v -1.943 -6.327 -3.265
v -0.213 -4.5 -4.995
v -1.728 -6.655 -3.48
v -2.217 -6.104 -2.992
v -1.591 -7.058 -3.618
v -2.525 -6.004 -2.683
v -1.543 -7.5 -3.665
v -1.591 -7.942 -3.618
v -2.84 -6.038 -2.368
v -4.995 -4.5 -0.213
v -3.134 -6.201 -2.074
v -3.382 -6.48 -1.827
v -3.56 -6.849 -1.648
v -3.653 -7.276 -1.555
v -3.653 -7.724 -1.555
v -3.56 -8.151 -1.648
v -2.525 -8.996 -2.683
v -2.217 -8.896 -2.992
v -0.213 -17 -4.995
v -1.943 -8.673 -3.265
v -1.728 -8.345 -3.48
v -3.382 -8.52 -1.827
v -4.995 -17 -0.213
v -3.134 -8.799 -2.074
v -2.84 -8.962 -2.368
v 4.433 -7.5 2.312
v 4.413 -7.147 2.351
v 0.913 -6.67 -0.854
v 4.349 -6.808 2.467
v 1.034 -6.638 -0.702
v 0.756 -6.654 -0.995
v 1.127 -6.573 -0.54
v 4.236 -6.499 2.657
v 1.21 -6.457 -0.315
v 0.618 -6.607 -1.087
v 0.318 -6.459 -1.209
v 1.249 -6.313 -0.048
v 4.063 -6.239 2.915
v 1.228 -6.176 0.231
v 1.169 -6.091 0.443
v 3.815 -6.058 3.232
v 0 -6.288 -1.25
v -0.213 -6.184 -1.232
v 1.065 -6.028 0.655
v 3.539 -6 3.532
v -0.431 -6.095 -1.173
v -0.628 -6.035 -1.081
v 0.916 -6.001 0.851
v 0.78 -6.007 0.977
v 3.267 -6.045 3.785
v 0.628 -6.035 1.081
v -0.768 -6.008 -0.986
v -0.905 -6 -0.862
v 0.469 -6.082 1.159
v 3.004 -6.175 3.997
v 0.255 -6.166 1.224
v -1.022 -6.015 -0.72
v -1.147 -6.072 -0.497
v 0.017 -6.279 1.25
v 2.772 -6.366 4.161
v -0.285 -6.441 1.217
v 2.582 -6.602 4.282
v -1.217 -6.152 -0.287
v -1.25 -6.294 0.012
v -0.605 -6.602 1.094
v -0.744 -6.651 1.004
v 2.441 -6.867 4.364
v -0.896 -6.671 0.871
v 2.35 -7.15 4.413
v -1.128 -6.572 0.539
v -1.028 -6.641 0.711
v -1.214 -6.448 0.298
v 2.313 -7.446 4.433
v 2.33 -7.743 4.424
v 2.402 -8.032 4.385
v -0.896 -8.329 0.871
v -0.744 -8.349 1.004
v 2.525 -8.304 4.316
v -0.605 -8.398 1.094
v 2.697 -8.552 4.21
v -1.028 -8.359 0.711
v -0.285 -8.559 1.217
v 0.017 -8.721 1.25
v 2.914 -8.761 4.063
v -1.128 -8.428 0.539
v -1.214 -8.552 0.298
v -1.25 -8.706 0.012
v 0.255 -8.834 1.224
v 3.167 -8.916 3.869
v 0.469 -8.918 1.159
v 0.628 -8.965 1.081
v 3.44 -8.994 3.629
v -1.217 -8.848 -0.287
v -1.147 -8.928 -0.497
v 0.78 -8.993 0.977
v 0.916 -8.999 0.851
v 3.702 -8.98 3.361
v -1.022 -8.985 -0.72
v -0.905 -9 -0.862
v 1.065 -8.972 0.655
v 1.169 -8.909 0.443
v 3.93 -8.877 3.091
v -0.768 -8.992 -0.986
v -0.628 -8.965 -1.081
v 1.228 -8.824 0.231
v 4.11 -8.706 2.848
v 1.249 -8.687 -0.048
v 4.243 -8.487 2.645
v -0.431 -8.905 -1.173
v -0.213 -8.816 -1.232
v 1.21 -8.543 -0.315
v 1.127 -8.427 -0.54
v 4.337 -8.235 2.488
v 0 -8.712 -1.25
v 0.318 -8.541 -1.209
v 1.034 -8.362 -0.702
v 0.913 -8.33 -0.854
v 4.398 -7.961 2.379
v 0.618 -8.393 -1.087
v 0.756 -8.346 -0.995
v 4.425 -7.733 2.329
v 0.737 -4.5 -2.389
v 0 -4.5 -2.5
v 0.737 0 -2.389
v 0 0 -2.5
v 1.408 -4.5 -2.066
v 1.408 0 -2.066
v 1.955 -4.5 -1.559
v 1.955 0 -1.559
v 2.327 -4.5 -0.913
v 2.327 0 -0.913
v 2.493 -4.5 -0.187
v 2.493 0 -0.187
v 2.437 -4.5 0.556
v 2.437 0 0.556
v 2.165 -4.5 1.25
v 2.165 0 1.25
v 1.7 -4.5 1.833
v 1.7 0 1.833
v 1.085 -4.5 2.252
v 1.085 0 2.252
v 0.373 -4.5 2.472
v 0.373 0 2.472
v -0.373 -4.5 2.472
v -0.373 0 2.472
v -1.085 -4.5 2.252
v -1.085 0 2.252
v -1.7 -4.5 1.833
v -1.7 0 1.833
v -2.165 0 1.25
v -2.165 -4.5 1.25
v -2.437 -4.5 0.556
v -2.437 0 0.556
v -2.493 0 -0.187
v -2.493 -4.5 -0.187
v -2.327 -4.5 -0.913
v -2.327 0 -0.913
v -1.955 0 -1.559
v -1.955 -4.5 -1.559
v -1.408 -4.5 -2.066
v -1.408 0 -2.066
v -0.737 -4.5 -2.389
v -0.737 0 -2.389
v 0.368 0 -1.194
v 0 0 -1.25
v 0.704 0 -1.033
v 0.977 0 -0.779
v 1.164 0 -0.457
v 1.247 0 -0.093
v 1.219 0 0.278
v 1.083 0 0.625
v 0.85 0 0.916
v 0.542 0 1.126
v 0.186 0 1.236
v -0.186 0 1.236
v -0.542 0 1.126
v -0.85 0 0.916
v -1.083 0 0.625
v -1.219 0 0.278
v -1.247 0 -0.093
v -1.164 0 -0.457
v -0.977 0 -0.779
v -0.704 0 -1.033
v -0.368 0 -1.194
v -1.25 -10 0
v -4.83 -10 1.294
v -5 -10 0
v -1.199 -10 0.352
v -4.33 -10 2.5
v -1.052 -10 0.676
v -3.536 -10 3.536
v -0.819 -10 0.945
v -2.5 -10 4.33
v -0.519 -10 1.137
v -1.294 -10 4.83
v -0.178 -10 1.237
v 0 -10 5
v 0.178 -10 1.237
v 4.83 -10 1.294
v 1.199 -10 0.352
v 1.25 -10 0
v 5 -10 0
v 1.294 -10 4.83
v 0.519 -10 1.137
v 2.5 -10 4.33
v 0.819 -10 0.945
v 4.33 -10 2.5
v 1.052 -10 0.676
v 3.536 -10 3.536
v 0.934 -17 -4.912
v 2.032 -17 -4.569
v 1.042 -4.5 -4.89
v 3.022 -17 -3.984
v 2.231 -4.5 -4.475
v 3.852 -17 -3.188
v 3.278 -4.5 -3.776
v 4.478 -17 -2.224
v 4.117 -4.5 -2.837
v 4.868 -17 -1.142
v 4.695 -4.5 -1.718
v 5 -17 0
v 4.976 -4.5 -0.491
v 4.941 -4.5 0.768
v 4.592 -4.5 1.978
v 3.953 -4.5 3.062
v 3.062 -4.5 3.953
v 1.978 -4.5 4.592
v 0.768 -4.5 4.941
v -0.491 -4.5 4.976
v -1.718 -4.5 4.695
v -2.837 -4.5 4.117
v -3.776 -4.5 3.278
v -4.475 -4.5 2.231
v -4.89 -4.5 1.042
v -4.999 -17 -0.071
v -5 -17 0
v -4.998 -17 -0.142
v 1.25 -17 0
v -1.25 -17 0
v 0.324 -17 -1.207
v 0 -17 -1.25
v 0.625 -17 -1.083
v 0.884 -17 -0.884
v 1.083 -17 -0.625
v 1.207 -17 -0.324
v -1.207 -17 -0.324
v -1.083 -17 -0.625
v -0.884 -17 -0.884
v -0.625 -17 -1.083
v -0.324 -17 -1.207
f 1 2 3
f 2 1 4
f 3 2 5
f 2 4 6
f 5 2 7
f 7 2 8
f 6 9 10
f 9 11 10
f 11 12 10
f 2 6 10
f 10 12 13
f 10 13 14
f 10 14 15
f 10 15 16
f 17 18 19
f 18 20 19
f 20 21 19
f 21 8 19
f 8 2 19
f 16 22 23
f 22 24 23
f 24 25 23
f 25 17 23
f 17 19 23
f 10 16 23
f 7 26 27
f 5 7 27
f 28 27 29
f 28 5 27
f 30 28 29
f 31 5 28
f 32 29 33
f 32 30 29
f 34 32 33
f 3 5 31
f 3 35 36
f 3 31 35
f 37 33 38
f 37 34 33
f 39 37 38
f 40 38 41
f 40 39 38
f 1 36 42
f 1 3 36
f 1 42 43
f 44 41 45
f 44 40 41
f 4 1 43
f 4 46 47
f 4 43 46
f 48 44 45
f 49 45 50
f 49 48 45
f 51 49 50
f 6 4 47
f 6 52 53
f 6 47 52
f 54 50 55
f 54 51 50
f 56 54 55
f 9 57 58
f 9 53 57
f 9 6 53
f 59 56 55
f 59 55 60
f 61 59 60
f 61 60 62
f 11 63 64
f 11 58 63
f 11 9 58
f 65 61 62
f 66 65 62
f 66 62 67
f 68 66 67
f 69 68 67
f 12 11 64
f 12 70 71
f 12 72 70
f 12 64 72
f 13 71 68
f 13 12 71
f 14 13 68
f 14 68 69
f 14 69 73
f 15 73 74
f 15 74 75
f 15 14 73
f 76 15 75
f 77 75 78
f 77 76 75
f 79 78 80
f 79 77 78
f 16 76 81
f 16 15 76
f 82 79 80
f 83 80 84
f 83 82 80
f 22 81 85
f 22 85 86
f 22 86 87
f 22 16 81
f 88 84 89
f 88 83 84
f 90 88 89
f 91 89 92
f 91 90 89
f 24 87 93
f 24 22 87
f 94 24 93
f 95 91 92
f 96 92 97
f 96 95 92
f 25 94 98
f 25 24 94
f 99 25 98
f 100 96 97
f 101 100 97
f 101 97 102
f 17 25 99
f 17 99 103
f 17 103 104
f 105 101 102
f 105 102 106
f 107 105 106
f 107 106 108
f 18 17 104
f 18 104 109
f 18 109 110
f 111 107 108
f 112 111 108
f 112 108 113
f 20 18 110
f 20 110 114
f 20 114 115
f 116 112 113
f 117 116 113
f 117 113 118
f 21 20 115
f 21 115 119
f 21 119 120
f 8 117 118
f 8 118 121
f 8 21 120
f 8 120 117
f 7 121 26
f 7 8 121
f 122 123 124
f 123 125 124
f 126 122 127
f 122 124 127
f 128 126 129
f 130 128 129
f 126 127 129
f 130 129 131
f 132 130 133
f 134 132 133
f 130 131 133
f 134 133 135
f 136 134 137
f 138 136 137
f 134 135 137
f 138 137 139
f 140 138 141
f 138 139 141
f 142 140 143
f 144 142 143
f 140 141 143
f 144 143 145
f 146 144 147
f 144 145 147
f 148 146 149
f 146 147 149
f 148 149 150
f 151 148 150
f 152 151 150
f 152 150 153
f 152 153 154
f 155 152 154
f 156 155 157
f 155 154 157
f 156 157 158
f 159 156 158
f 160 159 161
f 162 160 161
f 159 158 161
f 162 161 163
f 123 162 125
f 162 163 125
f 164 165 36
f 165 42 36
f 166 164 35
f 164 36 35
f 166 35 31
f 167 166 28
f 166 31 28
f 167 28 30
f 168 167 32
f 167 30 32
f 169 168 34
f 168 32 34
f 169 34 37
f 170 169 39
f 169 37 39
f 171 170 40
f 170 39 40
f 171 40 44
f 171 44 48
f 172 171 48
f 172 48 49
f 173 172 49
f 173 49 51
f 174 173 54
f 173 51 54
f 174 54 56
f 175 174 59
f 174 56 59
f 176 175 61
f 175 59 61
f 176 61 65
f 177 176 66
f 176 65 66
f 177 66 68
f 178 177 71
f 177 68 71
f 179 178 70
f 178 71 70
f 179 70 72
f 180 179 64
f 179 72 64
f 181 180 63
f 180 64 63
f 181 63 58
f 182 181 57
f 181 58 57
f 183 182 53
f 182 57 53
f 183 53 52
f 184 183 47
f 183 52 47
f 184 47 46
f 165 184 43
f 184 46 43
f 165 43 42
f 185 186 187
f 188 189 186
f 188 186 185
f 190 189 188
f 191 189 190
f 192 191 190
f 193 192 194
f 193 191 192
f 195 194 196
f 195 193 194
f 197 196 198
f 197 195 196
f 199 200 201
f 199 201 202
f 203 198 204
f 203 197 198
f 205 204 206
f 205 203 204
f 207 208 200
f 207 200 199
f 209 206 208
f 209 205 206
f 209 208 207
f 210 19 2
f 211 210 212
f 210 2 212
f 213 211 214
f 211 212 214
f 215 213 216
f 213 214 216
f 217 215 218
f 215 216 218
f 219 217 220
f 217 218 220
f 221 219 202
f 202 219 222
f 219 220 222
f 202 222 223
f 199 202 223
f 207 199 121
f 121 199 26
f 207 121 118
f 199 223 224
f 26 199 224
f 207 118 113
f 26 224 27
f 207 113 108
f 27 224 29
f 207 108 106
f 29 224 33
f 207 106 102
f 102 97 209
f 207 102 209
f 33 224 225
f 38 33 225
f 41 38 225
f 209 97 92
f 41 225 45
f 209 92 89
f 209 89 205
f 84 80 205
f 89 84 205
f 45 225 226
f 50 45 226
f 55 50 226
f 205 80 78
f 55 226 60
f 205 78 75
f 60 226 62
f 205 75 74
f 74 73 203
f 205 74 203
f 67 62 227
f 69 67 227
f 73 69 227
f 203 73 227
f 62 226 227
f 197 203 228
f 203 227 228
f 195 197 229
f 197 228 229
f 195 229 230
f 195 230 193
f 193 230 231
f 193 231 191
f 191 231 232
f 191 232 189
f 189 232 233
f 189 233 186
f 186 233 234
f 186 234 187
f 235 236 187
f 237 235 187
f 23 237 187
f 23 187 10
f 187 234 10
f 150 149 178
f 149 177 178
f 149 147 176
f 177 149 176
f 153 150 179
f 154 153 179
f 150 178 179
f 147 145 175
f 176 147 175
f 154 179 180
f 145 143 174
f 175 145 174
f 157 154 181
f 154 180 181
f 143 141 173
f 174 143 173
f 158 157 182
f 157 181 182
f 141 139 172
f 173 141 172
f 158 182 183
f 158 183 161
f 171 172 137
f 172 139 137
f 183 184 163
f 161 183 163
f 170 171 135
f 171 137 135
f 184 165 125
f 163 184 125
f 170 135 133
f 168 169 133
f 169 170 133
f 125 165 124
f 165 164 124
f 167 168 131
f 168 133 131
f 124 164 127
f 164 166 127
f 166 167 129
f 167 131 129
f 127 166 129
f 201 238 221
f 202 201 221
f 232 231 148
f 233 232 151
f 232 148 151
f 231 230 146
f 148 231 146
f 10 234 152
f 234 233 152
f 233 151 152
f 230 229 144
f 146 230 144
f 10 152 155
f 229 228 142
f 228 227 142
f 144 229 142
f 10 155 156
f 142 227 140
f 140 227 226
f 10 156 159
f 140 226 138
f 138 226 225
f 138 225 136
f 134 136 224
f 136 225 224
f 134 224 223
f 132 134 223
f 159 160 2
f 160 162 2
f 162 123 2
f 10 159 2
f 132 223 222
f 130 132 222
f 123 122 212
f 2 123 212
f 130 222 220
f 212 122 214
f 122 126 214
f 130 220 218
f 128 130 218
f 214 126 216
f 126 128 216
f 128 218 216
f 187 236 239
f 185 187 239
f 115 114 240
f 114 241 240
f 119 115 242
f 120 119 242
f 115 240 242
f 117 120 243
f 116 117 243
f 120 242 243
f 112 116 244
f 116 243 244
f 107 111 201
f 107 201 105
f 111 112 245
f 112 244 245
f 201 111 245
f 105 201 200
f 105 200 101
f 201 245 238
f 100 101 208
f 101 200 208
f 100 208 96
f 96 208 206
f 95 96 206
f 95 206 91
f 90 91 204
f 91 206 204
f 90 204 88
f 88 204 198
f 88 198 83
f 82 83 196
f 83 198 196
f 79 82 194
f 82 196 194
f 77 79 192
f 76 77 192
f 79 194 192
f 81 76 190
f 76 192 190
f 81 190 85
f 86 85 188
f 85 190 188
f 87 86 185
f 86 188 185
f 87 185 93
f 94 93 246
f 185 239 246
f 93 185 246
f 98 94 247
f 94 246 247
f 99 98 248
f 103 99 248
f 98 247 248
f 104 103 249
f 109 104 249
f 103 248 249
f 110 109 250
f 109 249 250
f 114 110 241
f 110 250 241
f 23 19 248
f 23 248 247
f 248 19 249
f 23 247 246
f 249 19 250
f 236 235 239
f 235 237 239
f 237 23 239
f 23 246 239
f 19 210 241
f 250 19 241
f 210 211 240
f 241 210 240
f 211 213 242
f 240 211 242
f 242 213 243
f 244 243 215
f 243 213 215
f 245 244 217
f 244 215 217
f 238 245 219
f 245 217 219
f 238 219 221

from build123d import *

# Parameters (mm, degrees)
CUT_EXTRUDE_1_DEPTH             = 7
CUT_EXTRUDE_2_DEPTH             = 18
SKETCH_5_R                      = 1.5
CUT_EXTRUDE_3_DEPTH             = 4.388378183
CUT_EXTRUDE_3_DIRECTION_2_REACH = 12.754


with BuildPart() as part:
    # Эскиз1 → Повернуть1 (revolve)
    with BuildSketch(Plane(origin=(0, 0, 0), x_dir=(0, 0, -1), z_dir=(1, 0, 0))):
        Polygon((2.5, -4.5), (2.5, 0), (1.25, 0), (1.25, -17), (5, -17), (5, -4.5), align=None)
    revolve(axis=Axis((0, 0, 0), (0, -1, 0)))

    # Эскиз2 → Вырез-Вытянуть1 (cut)
    with BuildSketch(Plane.XZ.offset(17)):
        Polygon((-37.360679775, 0), (-5, 0), (5, 0), (37.360679775, 0), (37.360679775, 64.72135955), (-37.360679775, 64.72135955), align=None)
    extrude(amount=-CUT_EXTRUDE_1_DEPTH, mode=Mode.SUBTRACT)

    # Эскиз3 → Вырез-Вытянуть2 (cut, through all)
    with BuildSketch(Plane.XZ.offset(17)):
        with BuildLine():
            Line((-0.212632943, -4.995476677), (-4.995476677, -0.212632943))
            ThreePointArc((-4.995476677, -0.212632943), (-3.535533906, -3.535533906), (-0.212632943, -4.995476677))
        make_face()
    extrude(amount=-CUT_EXTRUDE_2_DEPTH, mode=Mode.SUBTRACT)

    # Эскиз5 → Вырез-Вытянуть3 (cut)
    with BuildSketch(Plane(origin=(-7.70810962, 0, 2.5), x_dir=(0.707106781, 0, -0.707106781), z_dir=(0.707106781, 0, 0.707106781))):
        with Locations((7.218223535, -7.5)):
            Circle(SKETCH_5_R)
    extrude(amount=-CUT_EXTRUDE_3_DEPTH, mode=Mode.SUBTRACT)

    # Эскиз5 → Вырез-Вытянуть3 direction 2 (cut, up to next)
    with BuildSketch(Plane(origin=(-7.70810962, 0, 2.5), x_dir=(0.707106781, 0, -0.707106781), z_dir=(0.707106781, 0, 0.707106781)), mode=Mode.PRIVATE) as cut_extrude_3_direction_2_sk1:
        with Locations((7.218223535, -7.5)):
            Circle(SKETCH_5_R)
    cut_extrude_3_direction_2_tool1 = extrude(cut_extrude_3_direction_2_sk1.sketch, amount=CUT_EXTRUDE_3_DIRECTION_2_REACH, mode=Mode.PRIVATE) & part.part
    add(cut_extrude_3_direction_2_tool1.solids().sort_by_distance((-2.604055, -7.5, -2.604055))[0], mode=Mode.SUBTRACT)


solid = part.part
